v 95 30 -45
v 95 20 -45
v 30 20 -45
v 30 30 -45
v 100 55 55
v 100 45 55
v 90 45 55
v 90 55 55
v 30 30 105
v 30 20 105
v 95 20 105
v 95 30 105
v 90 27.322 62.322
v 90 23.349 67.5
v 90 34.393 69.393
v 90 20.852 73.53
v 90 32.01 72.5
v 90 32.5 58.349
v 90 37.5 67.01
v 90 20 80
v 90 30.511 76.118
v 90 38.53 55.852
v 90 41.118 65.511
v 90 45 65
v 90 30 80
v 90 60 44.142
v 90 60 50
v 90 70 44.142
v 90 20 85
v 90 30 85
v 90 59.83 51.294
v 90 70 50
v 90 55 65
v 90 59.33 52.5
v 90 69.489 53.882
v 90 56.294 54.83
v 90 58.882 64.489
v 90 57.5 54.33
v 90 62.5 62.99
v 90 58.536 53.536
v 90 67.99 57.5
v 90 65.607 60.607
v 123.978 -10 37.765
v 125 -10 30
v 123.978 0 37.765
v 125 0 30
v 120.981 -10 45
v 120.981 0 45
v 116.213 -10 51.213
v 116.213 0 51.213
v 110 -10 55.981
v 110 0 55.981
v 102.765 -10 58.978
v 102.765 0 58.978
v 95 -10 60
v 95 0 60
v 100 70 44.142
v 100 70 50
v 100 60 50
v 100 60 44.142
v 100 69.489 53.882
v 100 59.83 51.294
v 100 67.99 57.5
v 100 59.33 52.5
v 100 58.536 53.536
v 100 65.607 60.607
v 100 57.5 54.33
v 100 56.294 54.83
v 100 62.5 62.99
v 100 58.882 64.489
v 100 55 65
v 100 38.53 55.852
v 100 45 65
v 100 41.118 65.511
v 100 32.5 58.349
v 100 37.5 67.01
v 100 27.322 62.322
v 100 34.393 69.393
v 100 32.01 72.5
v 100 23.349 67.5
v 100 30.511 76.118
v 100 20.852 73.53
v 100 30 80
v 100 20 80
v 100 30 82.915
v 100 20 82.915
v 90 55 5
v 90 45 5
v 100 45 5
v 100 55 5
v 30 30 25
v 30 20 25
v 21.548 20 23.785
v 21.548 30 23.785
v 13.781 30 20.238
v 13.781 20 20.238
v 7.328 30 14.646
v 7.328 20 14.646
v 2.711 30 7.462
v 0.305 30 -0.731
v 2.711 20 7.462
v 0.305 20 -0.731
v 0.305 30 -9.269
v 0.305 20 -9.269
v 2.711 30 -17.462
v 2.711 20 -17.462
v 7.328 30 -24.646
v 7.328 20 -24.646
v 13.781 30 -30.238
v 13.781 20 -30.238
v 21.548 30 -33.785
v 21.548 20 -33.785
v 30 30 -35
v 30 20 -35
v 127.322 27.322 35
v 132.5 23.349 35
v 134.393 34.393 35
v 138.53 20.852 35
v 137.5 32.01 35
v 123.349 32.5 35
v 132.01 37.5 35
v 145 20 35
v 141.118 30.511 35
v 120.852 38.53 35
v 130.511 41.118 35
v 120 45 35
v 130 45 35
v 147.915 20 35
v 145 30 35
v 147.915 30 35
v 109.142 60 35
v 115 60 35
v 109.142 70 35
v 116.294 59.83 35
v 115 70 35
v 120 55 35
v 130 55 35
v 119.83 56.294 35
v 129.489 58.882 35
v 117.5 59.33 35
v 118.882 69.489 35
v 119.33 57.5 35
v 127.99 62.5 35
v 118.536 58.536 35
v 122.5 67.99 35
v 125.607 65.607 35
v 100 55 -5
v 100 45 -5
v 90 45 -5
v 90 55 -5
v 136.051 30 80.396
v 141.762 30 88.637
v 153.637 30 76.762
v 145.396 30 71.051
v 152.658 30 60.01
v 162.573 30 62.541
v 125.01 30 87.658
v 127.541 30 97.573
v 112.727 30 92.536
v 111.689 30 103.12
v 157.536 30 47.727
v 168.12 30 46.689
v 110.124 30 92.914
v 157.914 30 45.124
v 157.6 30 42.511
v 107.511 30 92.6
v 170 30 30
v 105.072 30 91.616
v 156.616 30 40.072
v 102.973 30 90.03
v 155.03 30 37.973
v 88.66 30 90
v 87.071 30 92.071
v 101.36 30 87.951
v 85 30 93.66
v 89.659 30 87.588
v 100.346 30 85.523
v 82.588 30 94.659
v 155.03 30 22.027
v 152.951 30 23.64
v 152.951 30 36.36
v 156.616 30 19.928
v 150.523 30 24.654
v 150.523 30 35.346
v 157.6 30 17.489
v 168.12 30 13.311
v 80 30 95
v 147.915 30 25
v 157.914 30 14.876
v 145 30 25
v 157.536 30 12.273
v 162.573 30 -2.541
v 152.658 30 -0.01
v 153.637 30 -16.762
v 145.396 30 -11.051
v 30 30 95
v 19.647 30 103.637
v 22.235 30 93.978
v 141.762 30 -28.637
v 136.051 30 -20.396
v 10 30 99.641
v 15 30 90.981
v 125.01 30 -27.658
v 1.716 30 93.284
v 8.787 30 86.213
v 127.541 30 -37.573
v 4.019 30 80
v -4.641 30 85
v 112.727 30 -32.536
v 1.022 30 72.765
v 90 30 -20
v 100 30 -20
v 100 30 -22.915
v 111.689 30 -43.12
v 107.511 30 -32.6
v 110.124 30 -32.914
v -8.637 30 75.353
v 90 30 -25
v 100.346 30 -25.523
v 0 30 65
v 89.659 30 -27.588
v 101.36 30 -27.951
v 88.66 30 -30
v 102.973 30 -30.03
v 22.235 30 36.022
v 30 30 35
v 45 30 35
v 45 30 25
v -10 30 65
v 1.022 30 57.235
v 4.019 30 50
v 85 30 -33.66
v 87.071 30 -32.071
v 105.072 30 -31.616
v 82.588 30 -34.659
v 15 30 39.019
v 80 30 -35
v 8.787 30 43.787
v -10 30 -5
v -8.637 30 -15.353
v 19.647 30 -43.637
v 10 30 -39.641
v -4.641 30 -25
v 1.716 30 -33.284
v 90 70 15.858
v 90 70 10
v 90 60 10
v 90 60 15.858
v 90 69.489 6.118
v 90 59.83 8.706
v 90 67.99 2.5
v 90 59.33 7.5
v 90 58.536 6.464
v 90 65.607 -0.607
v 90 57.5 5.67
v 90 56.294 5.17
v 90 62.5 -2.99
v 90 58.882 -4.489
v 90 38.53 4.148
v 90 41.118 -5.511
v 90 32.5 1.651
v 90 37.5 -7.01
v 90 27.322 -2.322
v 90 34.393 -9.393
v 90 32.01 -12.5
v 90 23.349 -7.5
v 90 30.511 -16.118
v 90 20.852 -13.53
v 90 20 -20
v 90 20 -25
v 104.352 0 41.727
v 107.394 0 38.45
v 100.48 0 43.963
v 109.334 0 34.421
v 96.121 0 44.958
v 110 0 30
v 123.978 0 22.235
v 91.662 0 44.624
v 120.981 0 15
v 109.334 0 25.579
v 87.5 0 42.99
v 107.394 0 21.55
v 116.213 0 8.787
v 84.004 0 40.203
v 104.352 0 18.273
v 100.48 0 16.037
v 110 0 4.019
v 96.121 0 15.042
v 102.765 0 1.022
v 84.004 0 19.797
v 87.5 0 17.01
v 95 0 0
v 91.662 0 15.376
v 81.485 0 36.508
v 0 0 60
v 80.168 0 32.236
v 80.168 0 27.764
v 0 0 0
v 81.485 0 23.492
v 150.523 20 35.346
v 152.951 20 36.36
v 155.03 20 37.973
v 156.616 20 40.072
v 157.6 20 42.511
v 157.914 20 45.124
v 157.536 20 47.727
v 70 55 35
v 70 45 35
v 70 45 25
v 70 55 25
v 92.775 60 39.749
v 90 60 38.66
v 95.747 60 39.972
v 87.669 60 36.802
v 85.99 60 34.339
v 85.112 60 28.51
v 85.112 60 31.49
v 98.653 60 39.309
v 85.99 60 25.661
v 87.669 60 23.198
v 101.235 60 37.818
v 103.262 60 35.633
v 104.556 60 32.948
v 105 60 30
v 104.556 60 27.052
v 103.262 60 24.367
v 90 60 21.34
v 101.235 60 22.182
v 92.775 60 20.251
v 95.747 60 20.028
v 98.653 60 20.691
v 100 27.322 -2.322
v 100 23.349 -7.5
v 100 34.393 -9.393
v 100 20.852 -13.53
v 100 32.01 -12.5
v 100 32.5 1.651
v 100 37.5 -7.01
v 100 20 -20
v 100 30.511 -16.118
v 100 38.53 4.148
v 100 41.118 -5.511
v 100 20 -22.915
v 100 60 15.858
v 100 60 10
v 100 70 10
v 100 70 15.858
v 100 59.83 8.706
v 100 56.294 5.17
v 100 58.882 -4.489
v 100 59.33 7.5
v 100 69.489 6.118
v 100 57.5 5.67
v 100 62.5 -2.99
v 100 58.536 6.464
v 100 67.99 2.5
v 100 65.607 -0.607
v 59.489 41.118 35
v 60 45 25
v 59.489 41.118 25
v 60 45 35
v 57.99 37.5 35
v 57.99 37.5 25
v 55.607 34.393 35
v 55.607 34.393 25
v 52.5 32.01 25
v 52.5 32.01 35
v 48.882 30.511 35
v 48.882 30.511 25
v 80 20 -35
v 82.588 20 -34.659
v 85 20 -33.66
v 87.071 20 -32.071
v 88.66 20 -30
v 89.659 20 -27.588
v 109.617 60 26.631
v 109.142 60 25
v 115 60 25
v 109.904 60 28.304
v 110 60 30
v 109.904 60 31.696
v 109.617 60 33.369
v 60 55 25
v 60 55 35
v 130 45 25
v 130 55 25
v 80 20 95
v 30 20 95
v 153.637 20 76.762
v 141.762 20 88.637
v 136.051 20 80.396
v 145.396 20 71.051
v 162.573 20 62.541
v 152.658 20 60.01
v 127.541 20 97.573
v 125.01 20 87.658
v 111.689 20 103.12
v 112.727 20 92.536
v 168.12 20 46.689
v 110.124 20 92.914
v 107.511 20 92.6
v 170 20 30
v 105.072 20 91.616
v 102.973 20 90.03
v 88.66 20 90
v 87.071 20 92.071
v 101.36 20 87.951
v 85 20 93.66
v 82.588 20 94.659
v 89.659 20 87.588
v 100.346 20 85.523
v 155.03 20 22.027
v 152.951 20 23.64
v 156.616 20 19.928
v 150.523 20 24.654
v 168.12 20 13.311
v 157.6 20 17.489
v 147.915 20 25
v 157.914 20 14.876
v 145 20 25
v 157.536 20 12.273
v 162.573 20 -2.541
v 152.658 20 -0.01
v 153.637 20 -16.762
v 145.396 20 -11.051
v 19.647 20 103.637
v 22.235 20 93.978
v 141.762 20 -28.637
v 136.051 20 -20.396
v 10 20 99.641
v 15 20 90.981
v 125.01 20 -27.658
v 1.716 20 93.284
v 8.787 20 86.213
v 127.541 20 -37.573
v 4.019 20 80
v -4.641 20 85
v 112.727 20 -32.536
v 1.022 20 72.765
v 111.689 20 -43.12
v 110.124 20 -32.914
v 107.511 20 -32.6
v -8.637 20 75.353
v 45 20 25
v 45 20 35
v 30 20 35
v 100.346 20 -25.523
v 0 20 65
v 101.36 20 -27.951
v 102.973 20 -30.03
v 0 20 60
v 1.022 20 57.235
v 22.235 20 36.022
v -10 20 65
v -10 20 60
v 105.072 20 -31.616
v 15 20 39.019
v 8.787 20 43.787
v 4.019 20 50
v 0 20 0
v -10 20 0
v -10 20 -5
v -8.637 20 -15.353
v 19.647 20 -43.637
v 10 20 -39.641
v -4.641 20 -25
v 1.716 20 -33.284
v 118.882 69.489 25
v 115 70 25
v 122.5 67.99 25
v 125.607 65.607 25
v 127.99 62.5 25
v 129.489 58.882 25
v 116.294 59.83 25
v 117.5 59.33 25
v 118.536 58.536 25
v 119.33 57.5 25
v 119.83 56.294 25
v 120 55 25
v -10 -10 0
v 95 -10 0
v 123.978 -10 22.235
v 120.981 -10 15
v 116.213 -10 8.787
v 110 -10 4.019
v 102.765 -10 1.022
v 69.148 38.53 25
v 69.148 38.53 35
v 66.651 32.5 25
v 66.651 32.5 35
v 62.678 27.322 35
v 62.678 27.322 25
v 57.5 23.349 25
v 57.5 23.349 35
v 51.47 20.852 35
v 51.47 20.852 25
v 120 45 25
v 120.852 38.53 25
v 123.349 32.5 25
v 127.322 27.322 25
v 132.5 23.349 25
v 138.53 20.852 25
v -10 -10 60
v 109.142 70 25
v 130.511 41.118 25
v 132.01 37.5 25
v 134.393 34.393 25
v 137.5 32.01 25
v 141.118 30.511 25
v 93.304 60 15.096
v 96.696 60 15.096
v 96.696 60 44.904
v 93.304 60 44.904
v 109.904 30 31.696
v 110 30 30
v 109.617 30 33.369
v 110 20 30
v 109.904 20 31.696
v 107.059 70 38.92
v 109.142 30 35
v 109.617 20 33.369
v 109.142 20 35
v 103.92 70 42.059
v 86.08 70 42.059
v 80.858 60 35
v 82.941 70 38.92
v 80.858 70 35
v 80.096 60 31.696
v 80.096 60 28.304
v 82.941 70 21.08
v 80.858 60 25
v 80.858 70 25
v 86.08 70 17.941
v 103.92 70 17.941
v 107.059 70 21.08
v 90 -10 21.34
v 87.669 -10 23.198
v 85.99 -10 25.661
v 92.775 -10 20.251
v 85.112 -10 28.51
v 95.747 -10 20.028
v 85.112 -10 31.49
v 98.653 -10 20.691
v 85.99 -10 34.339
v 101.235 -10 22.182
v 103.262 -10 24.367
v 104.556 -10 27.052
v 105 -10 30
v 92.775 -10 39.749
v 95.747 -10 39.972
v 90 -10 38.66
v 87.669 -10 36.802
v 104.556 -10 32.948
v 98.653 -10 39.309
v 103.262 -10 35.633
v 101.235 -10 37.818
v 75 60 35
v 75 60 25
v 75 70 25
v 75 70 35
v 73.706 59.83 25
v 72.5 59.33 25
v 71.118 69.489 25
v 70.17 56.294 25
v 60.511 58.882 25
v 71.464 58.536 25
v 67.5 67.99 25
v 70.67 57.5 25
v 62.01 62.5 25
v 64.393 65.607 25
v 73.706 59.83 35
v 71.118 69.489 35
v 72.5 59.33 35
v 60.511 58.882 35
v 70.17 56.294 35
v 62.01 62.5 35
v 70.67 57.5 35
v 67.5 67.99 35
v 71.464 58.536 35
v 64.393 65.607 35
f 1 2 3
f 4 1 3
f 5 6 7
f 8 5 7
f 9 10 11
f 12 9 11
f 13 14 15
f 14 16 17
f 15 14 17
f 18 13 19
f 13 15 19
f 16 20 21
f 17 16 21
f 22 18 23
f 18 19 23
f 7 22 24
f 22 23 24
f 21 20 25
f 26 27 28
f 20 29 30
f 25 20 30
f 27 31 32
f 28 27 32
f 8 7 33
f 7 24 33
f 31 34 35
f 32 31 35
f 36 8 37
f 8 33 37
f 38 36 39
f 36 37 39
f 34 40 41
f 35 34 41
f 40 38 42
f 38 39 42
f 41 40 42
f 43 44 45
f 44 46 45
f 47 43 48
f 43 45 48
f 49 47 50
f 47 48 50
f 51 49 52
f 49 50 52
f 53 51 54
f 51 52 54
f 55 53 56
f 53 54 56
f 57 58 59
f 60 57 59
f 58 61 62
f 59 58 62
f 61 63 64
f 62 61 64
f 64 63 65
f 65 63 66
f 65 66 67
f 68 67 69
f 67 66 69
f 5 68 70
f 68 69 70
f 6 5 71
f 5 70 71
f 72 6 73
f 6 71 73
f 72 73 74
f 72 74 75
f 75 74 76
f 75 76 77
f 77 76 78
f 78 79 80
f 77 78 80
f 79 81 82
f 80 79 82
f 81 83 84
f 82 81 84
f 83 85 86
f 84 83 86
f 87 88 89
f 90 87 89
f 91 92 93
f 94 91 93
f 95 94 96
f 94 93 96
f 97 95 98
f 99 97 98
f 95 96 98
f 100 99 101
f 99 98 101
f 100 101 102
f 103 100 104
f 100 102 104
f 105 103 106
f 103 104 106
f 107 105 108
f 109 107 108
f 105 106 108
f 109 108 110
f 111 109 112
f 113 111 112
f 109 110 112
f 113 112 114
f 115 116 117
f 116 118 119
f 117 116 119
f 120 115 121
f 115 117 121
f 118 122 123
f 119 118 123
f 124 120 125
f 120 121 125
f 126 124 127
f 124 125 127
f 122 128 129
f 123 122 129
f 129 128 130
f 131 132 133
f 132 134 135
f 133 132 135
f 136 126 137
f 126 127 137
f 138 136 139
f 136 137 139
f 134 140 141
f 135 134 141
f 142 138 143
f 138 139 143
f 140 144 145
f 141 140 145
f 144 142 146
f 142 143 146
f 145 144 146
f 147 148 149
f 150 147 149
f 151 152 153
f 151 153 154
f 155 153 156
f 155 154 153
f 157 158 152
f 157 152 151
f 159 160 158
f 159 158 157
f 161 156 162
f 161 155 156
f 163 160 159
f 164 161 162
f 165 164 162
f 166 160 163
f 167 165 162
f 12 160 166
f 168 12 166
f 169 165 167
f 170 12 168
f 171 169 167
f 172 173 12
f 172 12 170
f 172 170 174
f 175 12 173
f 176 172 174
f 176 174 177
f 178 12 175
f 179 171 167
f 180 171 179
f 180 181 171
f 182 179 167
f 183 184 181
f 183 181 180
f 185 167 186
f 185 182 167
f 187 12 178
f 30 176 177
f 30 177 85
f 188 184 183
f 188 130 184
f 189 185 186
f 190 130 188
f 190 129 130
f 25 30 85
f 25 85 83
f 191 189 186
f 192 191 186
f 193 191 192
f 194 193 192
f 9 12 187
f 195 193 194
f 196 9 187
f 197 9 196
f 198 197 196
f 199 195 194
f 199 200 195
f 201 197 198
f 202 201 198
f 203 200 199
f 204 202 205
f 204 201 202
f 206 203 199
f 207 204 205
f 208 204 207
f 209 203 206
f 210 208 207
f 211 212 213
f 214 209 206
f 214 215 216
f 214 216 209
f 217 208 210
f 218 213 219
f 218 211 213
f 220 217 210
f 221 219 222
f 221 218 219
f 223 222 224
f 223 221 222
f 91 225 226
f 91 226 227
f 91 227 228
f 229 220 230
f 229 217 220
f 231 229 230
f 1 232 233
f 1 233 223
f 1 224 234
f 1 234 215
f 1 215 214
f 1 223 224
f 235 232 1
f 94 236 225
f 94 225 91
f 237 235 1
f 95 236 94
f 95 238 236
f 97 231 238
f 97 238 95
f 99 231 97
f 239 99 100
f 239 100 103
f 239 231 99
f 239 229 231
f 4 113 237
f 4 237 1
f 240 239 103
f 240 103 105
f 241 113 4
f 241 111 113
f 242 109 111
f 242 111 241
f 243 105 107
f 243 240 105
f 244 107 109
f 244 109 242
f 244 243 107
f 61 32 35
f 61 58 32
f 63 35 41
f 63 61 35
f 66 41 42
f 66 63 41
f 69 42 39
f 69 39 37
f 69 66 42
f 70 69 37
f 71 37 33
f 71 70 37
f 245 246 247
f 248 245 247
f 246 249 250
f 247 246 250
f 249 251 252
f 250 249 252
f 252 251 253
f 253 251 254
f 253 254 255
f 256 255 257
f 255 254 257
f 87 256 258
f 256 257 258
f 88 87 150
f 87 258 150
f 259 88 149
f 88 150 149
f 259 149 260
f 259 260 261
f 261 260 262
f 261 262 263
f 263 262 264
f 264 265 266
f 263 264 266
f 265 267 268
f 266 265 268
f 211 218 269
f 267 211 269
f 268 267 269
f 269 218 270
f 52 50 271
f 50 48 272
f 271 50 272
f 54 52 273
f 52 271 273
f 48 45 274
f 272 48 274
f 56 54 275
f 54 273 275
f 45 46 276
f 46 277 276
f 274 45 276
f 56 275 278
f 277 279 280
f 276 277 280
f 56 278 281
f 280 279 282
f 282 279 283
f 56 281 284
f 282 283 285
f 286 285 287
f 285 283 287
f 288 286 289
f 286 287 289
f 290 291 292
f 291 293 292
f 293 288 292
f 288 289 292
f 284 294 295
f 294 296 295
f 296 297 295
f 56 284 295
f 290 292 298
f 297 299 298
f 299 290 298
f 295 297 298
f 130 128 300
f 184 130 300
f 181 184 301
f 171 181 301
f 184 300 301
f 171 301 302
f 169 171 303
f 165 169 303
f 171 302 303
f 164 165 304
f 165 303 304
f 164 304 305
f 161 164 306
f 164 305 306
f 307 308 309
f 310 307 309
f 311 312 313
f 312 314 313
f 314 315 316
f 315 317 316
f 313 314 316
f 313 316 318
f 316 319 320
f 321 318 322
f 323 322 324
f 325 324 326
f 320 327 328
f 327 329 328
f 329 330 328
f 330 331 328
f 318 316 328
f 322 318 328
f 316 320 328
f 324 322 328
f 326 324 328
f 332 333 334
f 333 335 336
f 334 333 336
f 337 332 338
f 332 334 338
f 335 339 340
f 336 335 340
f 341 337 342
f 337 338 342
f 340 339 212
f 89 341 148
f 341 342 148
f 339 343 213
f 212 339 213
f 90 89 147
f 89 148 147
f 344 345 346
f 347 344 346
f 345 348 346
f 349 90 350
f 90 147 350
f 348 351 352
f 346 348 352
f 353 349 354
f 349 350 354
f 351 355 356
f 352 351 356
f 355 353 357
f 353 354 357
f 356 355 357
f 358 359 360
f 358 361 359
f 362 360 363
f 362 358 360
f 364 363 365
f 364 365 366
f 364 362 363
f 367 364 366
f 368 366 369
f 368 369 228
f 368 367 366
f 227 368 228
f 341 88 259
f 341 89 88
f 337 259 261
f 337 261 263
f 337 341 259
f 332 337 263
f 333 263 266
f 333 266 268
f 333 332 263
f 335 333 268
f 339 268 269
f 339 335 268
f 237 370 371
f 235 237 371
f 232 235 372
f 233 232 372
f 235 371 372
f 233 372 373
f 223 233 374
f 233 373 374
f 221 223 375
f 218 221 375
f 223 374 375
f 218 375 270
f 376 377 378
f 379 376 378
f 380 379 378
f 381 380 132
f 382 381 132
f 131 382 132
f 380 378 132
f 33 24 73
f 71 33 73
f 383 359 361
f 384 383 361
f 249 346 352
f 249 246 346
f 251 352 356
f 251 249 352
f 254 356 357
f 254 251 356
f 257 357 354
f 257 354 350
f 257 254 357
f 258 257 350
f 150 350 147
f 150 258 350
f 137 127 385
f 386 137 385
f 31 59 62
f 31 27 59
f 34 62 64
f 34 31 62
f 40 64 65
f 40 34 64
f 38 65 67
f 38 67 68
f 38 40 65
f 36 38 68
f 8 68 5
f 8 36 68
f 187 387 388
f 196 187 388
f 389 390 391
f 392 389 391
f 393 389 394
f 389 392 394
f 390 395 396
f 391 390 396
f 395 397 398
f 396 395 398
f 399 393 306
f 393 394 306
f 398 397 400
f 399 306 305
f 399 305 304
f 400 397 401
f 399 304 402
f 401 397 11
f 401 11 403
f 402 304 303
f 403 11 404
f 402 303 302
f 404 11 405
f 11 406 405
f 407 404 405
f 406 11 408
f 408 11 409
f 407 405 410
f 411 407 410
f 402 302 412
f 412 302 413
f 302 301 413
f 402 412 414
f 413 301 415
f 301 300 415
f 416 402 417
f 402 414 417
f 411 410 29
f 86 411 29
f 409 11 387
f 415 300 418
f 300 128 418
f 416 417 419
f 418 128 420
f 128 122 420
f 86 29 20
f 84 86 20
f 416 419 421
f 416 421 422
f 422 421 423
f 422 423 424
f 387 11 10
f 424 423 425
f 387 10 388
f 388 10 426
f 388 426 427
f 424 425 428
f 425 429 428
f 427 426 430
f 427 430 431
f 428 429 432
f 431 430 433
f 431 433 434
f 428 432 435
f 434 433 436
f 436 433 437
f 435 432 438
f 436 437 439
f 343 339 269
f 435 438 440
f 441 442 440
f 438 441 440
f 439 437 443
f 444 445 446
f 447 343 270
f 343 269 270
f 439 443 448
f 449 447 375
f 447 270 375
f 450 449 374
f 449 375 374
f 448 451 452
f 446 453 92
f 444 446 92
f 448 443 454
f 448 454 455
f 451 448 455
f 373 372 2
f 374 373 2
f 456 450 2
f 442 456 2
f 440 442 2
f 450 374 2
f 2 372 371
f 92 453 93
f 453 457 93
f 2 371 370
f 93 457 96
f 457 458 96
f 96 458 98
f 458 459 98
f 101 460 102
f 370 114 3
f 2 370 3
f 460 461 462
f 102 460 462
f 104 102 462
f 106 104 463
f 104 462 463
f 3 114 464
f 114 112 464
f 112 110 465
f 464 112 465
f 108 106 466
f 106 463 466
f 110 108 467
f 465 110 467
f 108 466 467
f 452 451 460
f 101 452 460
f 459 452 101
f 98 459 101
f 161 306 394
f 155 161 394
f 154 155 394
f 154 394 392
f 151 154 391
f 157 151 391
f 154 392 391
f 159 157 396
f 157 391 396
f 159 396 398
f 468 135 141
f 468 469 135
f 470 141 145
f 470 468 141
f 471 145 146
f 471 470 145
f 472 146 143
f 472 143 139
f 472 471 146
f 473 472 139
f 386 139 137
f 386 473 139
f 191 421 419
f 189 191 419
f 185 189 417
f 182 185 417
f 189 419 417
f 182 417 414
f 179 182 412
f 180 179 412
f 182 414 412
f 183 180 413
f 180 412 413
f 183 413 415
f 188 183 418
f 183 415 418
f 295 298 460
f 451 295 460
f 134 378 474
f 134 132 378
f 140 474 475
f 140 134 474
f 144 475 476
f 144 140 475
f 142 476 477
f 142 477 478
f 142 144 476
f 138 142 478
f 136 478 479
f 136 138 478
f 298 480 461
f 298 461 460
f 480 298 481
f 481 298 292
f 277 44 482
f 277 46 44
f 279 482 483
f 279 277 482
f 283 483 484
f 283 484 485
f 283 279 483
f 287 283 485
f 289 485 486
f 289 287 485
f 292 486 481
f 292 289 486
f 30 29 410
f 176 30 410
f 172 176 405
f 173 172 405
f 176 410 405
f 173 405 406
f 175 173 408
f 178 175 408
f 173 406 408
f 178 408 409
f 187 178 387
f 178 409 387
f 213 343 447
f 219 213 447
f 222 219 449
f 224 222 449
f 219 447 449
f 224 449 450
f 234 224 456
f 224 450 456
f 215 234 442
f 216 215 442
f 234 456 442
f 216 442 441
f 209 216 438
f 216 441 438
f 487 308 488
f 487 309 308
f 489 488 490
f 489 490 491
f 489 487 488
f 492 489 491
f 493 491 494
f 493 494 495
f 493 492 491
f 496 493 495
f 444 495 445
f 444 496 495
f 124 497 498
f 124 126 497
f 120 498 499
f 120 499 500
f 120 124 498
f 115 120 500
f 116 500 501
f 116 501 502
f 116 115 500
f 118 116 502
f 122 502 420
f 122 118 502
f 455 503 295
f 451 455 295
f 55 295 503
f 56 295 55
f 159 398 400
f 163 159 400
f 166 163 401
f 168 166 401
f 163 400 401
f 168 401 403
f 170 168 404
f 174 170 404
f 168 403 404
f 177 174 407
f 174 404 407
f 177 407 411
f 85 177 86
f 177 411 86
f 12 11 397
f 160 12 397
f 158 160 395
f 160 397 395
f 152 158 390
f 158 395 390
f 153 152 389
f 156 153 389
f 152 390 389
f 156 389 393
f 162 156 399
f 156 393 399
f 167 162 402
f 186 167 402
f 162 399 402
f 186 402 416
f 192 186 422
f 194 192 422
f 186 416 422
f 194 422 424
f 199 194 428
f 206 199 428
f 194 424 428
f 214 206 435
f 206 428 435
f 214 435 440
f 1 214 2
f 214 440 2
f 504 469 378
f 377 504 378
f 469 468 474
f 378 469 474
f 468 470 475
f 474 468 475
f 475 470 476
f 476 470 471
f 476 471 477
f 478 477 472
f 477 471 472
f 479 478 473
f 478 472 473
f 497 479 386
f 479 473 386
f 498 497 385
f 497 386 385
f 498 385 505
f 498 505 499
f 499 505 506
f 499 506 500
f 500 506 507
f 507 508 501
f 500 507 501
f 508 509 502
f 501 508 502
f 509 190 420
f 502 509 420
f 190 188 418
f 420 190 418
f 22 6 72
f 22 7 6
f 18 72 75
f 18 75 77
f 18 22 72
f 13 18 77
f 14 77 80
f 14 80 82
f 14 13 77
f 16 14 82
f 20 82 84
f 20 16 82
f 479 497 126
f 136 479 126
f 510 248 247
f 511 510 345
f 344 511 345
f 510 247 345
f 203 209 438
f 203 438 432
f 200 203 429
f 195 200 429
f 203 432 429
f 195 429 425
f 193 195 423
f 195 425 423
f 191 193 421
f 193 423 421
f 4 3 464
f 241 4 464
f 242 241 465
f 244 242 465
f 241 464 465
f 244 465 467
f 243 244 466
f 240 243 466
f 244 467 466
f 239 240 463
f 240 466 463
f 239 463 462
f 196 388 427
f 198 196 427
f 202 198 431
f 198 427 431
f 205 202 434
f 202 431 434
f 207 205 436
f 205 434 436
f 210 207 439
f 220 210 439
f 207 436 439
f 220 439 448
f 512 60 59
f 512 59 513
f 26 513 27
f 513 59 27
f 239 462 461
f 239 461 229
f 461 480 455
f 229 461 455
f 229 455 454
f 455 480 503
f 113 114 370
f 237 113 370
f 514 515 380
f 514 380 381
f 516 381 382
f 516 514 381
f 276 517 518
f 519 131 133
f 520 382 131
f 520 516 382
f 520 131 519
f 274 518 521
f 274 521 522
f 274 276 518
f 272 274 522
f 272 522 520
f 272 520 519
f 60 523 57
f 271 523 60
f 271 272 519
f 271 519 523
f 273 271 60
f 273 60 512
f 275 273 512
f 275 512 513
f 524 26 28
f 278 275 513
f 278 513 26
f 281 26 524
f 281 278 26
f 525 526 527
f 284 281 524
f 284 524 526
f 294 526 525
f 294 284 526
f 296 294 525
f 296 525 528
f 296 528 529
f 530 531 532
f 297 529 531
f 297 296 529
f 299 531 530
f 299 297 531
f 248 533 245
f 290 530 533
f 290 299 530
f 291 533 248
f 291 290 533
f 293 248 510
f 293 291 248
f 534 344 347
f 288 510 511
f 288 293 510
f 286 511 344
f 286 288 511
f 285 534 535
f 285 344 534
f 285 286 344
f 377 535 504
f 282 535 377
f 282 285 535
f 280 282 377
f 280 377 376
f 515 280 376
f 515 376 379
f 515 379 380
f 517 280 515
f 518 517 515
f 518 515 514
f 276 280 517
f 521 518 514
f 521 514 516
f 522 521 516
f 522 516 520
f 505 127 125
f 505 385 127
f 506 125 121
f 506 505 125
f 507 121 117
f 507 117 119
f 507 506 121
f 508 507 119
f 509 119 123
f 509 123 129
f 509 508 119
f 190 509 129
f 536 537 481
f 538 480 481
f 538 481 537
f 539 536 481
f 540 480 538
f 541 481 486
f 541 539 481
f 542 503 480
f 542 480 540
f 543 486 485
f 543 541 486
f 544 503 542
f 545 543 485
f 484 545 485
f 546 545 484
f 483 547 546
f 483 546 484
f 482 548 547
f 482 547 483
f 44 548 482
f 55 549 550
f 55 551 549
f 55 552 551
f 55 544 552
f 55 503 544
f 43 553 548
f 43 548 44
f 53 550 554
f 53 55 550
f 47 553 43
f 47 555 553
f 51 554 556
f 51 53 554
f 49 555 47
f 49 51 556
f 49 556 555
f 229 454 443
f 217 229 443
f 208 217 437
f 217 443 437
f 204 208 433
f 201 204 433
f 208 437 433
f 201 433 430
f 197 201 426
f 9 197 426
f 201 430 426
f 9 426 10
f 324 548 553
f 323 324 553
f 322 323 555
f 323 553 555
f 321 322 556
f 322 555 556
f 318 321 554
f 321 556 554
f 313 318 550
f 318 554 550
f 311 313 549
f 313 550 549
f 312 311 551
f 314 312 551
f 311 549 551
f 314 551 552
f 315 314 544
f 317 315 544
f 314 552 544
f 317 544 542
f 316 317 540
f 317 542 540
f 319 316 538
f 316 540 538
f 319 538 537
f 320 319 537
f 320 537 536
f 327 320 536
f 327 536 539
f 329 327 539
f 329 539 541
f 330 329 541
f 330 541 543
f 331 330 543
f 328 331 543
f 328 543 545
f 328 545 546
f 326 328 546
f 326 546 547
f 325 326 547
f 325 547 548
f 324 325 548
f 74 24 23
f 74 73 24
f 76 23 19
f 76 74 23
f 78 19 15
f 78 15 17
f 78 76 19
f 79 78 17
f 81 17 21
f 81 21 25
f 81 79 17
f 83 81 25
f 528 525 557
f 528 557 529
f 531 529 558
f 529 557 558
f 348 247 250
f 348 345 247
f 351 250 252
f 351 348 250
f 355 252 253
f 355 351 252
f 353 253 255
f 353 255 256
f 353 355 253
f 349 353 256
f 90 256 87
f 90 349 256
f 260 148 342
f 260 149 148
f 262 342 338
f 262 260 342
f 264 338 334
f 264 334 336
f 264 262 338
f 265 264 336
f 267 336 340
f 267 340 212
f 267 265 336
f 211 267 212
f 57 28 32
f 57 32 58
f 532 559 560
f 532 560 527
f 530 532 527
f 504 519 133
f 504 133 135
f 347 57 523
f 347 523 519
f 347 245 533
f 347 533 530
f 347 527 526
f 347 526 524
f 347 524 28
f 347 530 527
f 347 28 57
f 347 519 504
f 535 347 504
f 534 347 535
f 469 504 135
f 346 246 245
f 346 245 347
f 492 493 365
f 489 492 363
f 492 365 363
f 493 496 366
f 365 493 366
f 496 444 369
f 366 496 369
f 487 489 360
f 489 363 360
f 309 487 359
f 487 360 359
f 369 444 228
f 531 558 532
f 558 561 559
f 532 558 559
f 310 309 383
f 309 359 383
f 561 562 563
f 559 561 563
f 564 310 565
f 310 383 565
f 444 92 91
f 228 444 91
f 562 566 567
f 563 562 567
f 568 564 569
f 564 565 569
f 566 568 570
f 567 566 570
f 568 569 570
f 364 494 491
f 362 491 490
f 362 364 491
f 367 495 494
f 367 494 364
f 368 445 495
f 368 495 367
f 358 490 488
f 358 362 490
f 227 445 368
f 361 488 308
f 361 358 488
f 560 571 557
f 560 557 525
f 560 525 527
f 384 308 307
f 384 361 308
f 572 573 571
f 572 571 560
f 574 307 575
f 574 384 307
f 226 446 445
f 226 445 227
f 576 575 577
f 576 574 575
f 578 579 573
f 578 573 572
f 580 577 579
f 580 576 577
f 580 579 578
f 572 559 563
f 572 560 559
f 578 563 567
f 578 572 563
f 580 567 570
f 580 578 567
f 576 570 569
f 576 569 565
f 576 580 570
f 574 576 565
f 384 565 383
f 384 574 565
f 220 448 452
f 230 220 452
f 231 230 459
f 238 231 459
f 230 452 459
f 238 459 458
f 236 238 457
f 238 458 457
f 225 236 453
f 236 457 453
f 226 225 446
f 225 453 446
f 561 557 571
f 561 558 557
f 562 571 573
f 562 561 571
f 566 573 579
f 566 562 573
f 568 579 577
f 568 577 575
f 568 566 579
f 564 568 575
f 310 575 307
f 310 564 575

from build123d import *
from build123d.topology import SkipClean

# Parameters (mm, degrees)
Y_KSEKLIK_EKSTR_ZYON1_DEPTH = 60
RADYUS1_R                   = 30
IZIM4_R                     = 15
IZIM4_R_2                   = 10
Y_KSEKLIK_EKSTR_ZYON2_DEPTH = 70
IZIM5_R                     = 15
Y_KSEKLIK_EKSTR_ZYON3_DEPTH = 10
Y_KSEKLIK_EKSTR_ZYON4_START = -10
Y_KSEKLIK_EKSTR_ZYON4_DEPTH = 10
KES_EKSTR_ZYON1_START       = -10
KES_EKSTR_ZYON1_DEPTH       = 10
IZIM11_W                    = 10
IZIM11_H                    = 10
DAIRESEL_KAPLAMA3_COUNT     = 4
IZIM13_W                    = 10
IZIM13_H                    = 10
Y_KSEKLIK_EKSTR_ZYON5_DEPTH = 12.084973779
IZIM14_R                    = 10
KES_EKSTR_ZYON2_DEPTH       = 10


with BuildPart() as part:
    # Çizim2 → Yükseklik-Ekstrüzyon1 (new body)
    with BuildSketch(Plane.XY):
        Polygon((0, 0), (0, 30), (-10, 30), (-10, -10), (125, -10), (125, 0), align=None)
    extrude(amount=Y_KSEKLIK_EKSTR_ZYON1_DEPTH)

    # Radyus1
    radyus1_edges = [part.edges().sort_by_distance(p)[0] for p in [
        (125, -5, 0),
        (125, -5, 60),
    ]]
    fillet(radyus1_edges, radius=RADYUS1_R - 0.0001)  # a hair under: the kernel refuses the full size

    # Çizim4 → Yükseklik-Ekstrüzyon2 (add)
    with BuildSketch(Plane.XZ.offset(10)):
        with Locations((95, 30)):
            Circle(IZIM4_R)
        with Locations((95, 30)):
            Circle(IZIM4_R_2, mode=Mode.SUBTRACT)
    extrude(amount=-Y_KSEKLIK_EKSTR_ZYON2_DEPTH)

    # Çizim5 → Yükseklik-Ekstrüzyon3 (add)
    with BuildSketch(Plane(origin=(0, 60, 0), x_dir=(1, 0, 0), z_dir=(0, 1, 0))):
        with Locations((95, -30)):
            Circle(IZIM5_R)
    extrude(amount=Y_KSEKLIK_EKSTR_ZYON3_DEPTH)

    # Çizim7 → Yükseklik-Ekstrüzyon4 (add)
    with BuildSketch(Plane(origin=(0, 30, 0), x_dir=(1, 0, 0), z_dir=(0, 1, 0)).offset(Y_KSEKLIK_EKSTR_ZYON4_START)):
        with BuildLine():
            Line((95, 45), (30, 45))
            ThreePointArc((30, 45), (1.715728753, 33.284271247), (-10, 5))
            Line((-10, 5), (-10, -65))
            ThreePointArc((-10, -65), (1.715728753, -93.284271247), (30, -105))
            Line((30, -105), (94.99998957, -105))
            ThreePointArc((94.99998957, -105), (170, -30.000005215), (95, 45))
        make_face()
        with BuildLine():
            Line((80, -95), (30, -95))
            ThreePointArc((30, -95), (8.786796564, -86.213203436), (0, -65))
            ThreePointArc((0, -65), (8.786796564, -43.786796564), (30, -35))
            Line((30, -35), (80.857864376, -35))
            ThreePointArc((80.857864376, -35), (80, -30), (80.857864376, -25))
            Line((80.857864376, -25), (30, -25))
            ThreePointArc((30, -25), (0, 5), (30, 35))
            Line((30, 35), (80, 35))
            ThreePointArc((80, 35), (87.071067812, 32.071067812), (90, 25))
            Line((90, 25), (90, -15.857864376))
            ThreePointArc((90, -15.857864376), (95, -15), (100, -15.857864376))
            Line((100, -15.857864376), (100, 22.915026221))
            ThreePointArc((100, 22.915026221), (103.969773108, 30.892266573), (112.727272727, 32.53594008))
            ThreePointArc((112.727272727, 32.53594008), (140.961940777, 15.961940777), (157.53594008, -12.272727273))
            ThreePointArc((157.53594008, -12.272727273), (155.892266573, -21.030226892), (147.915026221, -25))
            Line((147.915026221, -25), (109.142135624, -25))
            ThreePointArc((109.142135624, -25), (110, -30), (109.142135624, -35))
            Line((109.142135624, -35), (147.915026221, -35))
            ThreePointArc((147.915026221, -35), (155.892266573, -38.969773108), (157.53594008, -47.727272727))
            ThreePointArc((157.53594008, -47.727272727), (140.961940777, -75.961940777), (112.727272727, -92.53594008))
            ThreePointArc((112.727272727, -92.53594008), (103.969773108, -90.892266573), (100, -82.915026221))
            Line((100, -82.915026221), (100, -44.142135624))
            ThreePointArc((100, -44.142135624), (95, -45), (90, -44.142135624))
            Line((90, -44.142135624), (90, -85))
            ThreePointArc((90, -85), (87.071067812, -92.071067812), (80, -95))
        make_face(mode=Mode.SUBTRACT)
    extrude(amount=Y_KSEKLIK_EKSTR_ZYON4_DEPTH)

    # Çizim8 → Kes-Ekstrüzyon1 (cut)
    with SkipClean():  # the faces are left unmerged after this step: merging them gives an invalid solid
        with BuildSketch(Plane(origin=(0, 30, 0), x_dir=(1, 0, 0), z_dir=(0, 1, 0)).offset(KES_EKSTR_ZYON1_START)):
            with BuildLine():
                Line((30, -25), (80.857864376, -25))
                ThreePointArc((80.857864376, -25), (80, -30), (80.857864376, -35))
                Line((80.857864376, -35), (30, -35))
                Line((30, -35), (30, -25))
            make_face()
            with BuildLine():
                Line((147.915026221, -25), (147.915026221, -35))
                Line((147.915026221, -35), (109.142135624, -35))
                ThreePointArc((109.142135624, -35), (110, -30), (109.142135624, -25))
                Line((109.142135624, -25), (147.915026221, -25))
            make_face()
            with BuildLine():
                Line((100, 22.915026221), (90, 22.915026221))
                Line((90, 22.915026221), (90, -15.857864376))
                ThreePointArc((90, -15.857864376), (95, -15), (100, -15.857864376))
                Line((100, -15.857864376), (100, 22.915026221))
            make_face()
            with BuildLine():
                Line((100, -82.915026221), (90, -82.915026221))
                Line((90, -82.915026221), (90, -44.142135624))
                ThreePointArc((90, -44.142135624), (95, -45), (100, -44.142135624))
                Line((100, -44.142135624), (100, -82.915026221))
            make_face()
        extrude(amount=KES_EKSTR_ZYON1_DEPTH, mode=Mode.SUBTRACT)
    add(part.part.scale(1), mode=Mode.REPLACE)  # the faces are merged on a copy

    # Süpür1: sweep along a path in Çizim10
    with BuildLine(Plane.XY.offset(30)) as s_p_r1_path:
        Line((95, 70), (115, 70))
        ThreePointArc((115, 70), (125.606601718, 65.606601718), (130, 55))
        Line((130, 55), (130, 45))
        ThreePointArc((130, 45), (134.393398282, 34.393398282), (145, 30))
        Line((145, 30), (147.915026221, 30))
    # Çizim11 → Süpür1 (sweep)
    with BuildSketch(Plane.ZY.offset(-147.915026221)):
        with Locations((30, 25)):
            Rectangle(IZIM11_W, IZIM11_H)
    s_p_r1 = sweep(path=s_p_r1_path.line)

    # Dairesel Kaplama3: Süpür1 ×4 about axis
    dairesel_kaplama3_axis = Axis((95, 0, 30), (0, 1, 0))
    for i in range(1, DAIRESEL_KAPLAMA3_COUNT):
        add(s_p_r1.rotate(dairesel_kaplama3_axis, i * 360 / DAIRESEL_KAPLAMA3_COUNT))

    # Çizim13 → Yükseklik-Ekstrüzyon5 (add)
    with BuildSketch(Plane(origin=(30, 0, 0), x_dir=(0, 0, -1), z_dir=(1, 0, 0))):
        with Locations((-30, 25)):
            Rectangle(IZIM13_W, IZIM13_H)
    extrude(amount=Y_KSEKLIK_EKSTR_ZYON5_DEPTH)

    # Çizim14 → Kes-Ekstrüzyon2 (cut)
    with BuildSketch(Plane.XZ.offset(10)):
        with Locations((95, 30)):
            Circle(IZIM14_R)
    extrude(amount=-KES_EKSTR_ZYON2_DEPTH, mode=Mode.SUBTRACT)


solid = part.part
